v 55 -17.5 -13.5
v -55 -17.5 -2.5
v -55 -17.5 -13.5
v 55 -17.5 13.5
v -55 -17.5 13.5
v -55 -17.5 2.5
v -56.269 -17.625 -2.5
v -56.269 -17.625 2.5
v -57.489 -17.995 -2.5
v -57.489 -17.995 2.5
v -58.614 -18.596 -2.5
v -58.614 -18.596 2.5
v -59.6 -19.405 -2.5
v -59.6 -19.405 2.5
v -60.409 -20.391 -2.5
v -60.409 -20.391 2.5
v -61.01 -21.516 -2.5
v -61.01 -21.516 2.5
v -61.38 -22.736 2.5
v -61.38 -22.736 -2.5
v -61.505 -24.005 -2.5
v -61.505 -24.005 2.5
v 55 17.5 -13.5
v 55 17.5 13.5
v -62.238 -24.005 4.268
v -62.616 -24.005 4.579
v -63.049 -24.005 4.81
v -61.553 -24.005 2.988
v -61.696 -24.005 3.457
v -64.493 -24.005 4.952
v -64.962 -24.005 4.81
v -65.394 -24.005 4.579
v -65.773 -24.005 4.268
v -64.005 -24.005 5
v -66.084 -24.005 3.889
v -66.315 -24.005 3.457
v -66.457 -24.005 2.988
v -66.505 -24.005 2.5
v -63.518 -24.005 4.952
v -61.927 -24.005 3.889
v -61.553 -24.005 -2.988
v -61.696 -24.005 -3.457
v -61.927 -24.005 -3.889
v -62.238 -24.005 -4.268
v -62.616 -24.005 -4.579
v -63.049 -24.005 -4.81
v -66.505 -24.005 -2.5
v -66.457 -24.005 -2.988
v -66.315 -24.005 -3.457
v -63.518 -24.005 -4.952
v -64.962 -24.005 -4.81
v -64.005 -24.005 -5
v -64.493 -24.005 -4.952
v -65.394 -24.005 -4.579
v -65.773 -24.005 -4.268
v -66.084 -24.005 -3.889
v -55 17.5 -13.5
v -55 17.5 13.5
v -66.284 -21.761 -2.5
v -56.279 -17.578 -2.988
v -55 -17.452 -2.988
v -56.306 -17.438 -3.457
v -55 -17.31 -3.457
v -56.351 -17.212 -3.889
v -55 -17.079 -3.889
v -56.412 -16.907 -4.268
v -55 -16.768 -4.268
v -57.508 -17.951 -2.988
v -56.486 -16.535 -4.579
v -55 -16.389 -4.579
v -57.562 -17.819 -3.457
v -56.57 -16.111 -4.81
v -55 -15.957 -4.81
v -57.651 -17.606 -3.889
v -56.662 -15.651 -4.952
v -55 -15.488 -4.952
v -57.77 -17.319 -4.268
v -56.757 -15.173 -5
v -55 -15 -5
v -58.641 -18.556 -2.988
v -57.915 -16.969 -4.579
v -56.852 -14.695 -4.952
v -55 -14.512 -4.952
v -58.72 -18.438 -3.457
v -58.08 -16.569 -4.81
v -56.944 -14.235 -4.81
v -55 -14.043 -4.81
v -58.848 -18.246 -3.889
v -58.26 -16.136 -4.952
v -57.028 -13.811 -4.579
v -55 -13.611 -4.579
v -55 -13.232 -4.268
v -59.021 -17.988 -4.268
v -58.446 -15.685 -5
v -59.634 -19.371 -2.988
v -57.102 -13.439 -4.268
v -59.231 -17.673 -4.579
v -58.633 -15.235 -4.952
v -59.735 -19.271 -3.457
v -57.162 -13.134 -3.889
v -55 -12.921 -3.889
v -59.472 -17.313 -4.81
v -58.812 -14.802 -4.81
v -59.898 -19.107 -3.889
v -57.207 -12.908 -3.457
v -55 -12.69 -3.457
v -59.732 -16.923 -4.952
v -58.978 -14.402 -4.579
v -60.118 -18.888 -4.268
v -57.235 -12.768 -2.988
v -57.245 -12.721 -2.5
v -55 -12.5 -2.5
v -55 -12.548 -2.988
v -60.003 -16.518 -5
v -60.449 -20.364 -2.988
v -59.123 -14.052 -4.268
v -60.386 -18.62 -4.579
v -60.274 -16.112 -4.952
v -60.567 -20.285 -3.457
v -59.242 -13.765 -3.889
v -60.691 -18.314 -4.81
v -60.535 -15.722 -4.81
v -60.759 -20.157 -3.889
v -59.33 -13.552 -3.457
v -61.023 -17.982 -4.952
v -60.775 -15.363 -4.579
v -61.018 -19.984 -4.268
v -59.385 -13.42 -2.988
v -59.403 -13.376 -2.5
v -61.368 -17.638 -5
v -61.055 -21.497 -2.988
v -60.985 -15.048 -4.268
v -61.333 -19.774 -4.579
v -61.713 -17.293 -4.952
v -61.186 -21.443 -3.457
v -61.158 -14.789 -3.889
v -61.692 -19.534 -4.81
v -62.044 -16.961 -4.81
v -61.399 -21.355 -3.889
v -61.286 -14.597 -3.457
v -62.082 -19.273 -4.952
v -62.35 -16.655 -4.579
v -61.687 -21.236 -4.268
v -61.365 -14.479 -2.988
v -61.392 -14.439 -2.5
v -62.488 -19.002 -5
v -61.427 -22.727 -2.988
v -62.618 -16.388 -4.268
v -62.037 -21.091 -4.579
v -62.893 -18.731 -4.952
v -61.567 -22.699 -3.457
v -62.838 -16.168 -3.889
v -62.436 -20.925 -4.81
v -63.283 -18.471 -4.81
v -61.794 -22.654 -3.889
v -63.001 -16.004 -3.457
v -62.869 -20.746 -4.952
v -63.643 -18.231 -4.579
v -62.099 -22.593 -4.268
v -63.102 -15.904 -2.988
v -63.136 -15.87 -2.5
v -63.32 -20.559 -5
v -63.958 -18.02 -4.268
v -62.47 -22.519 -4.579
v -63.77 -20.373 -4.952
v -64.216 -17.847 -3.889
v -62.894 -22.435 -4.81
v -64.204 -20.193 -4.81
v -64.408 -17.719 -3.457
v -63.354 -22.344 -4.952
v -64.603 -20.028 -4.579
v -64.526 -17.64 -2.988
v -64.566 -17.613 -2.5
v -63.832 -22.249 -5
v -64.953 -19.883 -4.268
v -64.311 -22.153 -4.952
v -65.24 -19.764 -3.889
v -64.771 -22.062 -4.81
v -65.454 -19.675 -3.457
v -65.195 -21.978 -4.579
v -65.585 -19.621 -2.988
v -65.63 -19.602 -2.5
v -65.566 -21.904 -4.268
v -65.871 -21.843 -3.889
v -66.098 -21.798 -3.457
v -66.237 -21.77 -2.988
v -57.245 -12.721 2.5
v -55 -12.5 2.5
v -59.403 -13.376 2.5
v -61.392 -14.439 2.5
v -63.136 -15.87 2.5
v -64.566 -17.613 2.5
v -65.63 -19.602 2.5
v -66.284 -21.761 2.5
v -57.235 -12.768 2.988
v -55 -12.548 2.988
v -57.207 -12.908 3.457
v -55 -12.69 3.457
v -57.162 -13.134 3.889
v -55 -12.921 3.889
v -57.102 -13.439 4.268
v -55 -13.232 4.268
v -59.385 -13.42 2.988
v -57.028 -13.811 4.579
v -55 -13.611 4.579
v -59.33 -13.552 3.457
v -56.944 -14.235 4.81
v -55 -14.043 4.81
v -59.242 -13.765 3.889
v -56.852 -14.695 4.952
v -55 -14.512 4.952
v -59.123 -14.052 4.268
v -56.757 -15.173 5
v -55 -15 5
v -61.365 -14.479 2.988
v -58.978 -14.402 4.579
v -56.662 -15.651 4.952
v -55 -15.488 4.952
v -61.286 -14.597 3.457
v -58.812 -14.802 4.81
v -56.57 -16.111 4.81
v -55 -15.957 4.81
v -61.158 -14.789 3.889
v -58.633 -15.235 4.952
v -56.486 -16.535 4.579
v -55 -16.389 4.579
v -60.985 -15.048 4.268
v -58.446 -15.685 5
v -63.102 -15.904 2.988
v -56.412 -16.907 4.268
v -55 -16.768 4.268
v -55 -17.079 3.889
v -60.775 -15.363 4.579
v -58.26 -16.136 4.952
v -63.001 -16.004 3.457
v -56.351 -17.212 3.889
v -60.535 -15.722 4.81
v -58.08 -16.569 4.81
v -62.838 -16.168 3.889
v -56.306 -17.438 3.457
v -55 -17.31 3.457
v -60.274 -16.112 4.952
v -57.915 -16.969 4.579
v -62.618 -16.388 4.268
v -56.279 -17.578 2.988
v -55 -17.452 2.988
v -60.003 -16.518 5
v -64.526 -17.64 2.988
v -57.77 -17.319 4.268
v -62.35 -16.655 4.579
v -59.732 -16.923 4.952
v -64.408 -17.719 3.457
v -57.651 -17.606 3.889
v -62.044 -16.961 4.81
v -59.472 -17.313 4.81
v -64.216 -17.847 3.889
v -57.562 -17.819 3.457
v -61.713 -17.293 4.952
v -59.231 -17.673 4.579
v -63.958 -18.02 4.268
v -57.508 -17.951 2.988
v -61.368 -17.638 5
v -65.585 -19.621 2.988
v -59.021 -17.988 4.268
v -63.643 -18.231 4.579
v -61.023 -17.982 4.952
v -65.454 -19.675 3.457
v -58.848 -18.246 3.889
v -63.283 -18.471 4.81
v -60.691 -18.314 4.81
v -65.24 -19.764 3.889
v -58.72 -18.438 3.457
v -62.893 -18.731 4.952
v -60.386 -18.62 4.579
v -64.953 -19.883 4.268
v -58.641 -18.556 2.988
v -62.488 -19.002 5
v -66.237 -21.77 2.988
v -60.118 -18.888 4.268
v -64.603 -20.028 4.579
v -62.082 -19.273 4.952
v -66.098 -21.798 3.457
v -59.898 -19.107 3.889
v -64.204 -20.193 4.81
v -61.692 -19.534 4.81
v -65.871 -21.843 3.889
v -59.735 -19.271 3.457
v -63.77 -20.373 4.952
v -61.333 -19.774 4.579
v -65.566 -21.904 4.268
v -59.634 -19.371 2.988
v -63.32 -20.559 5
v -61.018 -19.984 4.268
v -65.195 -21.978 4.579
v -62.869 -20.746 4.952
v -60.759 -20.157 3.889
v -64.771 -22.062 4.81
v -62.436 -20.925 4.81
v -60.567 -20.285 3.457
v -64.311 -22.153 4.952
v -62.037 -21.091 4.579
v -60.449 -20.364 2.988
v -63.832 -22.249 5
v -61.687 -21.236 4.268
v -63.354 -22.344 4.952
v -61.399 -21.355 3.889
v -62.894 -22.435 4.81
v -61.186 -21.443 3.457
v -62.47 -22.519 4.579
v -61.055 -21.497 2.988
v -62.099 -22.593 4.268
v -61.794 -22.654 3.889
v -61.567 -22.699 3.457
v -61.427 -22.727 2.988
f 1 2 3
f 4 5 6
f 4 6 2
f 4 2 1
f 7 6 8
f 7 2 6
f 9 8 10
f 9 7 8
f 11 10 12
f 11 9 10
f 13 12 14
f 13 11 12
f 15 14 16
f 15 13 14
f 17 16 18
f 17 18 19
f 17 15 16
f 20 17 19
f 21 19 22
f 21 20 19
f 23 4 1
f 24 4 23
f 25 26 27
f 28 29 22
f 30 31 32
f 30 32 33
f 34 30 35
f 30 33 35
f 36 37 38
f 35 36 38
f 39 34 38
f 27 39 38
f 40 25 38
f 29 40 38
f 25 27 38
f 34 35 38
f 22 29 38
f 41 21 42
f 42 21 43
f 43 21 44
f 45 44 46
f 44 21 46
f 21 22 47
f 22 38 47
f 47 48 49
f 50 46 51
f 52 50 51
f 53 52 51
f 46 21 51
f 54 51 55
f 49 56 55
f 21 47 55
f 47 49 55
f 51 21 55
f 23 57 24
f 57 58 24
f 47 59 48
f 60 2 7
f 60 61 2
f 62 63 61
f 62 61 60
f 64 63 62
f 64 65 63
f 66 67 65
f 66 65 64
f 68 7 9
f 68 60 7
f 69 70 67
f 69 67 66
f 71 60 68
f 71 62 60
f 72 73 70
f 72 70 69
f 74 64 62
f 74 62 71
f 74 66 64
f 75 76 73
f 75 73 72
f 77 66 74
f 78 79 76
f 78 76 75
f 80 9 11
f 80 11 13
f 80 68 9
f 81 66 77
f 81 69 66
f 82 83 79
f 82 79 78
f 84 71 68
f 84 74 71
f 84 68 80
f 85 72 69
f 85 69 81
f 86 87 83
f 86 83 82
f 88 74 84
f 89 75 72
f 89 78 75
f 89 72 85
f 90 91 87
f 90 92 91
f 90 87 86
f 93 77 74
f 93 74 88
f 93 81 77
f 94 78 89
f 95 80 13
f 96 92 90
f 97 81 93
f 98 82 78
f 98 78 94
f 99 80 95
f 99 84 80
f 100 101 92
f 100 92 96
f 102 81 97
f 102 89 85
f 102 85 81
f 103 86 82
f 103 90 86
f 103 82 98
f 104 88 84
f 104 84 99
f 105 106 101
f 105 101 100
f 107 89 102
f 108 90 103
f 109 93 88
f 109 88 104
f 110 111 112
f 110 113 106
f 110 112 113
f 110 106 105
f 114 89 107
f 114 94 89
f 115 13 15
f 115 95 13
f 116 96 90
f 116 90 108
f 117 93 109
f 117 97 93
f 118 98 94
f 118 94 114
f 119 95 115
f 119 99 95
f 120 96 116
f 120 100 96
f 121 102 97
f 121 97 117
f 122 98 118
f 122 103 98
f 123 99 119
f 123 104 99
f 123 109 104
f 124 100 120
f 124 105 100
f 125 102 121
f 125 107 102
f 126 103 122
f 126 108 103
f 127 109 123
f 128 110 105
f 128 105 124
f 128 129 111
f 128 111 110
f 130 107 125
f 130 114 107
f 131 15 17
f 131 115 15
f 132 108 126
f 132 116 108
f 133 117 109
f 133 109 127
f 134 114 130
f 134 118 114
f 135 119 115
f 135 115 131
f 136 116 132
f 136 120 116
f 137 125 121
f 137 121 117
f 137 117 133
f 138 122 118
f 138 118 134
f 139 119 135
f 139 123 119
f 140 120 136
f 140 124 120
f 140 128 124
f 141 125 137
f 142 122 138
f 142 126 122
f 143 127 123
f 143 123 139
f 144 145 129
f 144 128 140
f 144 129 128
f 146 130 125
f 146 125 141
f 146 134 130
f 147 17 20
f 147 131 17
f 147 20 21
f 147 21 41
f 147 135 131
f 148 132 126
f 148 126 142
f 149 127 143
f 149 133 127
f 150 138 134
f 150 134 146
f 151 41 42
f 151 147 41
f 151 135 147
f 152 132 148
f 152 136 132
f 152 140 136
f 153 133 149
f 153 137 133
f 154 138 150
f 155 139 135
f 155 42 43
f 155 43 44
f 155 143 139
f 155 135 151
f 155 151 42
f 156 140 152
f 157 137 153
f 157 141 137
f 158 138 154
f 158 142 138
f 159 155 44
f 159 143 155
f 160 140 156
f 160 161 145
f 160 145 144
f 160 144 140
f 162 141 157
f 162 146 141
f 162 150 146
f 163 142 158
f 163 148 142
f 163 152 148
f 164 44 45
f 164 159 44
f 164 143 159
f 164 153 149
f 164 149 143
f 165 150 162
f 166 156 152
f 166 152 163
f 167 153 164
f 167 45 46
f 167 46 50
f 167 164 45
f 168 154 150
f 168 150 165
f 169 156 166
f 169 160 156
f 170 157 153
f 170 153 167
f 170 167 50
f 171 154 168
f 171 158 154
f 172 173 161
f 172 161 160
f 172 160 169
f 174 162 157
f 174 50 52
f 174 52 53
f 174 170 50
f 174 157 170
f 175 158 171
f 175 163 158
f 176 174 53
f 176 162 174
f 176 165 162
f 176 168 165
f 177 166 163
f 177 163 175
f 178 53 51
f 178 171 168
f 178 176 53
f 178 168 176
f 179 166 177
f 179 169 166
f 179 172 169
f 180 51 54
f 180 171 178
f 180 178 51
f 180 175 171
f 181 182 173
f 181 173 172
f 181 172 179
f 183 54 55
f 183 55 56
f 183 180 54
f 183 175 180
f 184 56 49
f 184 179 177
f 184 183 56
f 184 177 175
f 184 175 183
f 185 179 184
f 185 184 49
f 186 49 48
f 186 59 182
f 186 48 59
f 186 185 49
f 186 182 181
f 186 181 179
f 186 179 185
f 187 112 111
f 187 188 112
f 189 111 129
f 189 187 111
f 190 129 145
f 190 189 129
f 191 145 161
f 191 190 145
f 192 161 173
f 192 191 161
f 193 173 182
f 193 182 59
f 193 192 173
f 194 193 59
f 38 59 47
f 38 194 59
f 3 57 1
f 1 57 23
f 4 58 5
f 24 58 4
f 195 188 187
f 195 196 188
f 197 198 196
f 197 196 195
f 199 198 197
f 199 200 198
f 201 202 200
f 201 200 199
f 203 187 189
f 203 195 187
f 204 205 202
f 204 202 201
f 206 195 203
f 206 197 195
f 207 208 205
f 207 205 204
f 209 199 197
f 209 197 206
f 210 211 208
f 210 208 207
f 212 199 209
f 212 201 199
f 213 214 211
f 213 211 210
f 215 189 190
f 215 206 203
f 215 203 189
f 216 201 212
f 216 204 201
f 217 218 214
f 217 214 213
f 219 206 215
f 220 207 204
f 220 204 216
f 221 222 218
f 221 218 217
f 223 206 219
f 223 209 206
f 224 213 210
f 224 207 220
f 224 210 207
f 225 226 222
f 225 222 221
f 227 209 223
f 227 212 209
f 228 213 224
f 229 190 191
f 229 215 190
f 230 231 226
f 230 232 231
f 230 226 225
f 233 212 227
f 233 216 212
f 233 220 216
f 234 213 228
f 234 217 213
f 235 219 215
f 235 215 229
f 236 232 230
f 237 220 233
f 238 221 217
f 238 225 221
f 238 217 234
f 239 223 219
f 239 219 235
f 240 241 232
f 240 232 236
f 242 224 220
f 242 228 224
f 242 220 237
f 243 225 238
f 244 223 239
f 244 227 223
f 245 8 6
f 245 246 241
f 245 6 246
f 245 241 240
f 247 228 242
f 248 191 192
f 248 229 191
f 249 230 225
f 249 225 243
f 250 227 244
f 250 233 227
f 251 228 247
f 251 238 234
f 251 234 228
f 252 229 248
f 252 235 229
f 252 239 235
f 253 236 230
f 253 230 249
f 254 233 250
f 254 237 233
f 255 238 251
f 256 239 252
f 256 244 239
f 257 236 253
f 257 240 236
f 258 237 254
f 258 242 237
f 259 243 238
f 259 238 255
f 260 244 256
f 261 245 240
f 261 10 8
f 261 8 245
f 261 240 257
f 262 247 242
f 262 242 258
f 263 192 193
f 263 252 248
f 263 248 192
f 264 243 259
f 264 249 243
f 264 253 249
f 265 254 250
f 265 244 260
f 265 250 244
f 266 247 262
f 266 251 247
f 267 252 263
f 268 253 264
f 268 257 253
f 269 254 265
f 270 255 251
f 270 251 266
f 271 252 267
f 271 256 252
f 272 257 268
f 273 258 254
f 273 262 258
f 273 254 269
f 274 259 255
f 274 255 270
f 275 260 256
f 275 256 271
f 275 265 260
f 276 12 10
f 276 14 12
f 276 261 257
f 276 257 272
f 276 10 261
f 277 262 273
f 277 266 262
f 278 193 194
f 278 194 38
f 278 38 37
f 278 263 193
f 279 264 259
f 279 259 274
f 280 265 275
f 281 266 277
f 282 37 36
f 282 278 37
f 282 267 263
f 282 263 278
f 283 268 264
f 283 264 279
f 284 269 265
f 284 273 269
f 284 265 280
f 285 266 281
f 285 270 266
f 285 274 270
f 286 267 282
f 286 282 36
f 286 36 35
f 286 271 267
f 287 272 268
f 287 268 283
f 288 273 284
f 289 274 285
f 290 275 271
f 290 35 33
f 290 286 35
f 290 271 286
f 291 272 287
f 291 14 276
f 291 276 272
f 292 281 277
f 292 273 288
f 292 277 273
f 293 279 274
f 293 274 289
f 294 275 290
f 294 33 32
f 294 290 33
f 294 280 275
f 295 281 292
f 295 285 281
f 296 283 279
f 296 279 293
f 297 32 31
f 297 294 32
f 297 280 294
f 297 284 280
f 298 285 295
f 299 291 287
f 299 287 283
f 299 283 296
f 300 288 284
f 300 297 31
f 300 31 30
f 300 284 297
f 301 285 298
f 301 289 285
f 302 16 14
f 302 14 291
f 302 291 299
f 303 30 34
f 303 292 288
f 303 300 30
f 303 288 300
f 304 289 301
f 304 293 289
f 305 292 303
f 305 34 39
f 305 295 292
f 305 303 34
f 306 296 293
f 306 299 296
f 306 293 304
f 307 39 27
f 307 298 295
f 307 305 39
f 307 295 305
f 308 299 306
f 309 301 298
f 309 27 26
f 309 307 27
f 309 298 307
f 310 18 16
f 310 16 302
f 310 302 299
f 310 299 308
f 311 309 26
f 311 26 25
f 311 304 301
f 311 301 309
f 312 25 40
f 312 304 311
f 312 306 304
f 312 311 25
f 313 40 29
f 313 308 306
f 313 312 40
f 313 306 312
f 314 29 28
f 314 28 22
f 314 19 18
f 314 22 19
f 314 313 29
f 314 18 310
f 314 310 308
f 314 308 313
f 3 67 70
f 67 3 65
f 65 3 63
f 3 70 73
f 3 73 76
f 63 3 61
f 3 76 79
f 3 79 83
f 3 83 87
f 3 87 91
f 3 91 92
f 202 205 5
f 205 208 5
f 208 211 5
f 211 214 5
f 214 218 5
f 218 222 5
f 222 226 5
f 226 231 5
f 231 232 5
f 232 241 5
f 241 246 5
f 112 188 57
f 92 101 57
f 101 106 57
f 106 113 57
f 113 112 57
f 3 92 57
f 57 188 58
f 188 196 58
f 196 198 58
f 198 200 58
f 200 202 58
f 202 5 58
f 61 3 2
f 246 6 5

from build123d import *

# Parameters (mm, degrees)
SKETCH_1_W      = 110
SKETCH_1_H      = 35
EXTRUDE_1_DEPTH = 13.5
REVOLVE_1_ANGLE = 90


with BuildPart() as part:
    # 草圖1 → 填料-伸長1 (new body, symmetric)
    with BuildSketch(Plane.XY):
        Rectangle(SKETCH_1_W, SKETCH_1_H)
    extrude(amount=EXTRUDE_1_DEPTH, both=True)

    # 草圖2 → 旋轉1 (revolve)
    with BuildSketch(Plane.ZY.offset(55)):
        with BuildLine():
            Line((-2.5, -12.5), (2.5, -12.5))
            ThreePointArc((2.5, -12.5), (5, -15), (2.5, -17.5))
            Line((2.5, -17.5), (-2.5, -17.5))
            ThreePointArc((-2.5, -17.5), (-5, -15), (-2.5, -12.5))
        make_face()
    revolve(axis=Axis((-55, -24.005362061, -6.079544695), (0, 0, 1)), revolution_arc=REVOLVE_1_ANGLE)


solid = part.part
